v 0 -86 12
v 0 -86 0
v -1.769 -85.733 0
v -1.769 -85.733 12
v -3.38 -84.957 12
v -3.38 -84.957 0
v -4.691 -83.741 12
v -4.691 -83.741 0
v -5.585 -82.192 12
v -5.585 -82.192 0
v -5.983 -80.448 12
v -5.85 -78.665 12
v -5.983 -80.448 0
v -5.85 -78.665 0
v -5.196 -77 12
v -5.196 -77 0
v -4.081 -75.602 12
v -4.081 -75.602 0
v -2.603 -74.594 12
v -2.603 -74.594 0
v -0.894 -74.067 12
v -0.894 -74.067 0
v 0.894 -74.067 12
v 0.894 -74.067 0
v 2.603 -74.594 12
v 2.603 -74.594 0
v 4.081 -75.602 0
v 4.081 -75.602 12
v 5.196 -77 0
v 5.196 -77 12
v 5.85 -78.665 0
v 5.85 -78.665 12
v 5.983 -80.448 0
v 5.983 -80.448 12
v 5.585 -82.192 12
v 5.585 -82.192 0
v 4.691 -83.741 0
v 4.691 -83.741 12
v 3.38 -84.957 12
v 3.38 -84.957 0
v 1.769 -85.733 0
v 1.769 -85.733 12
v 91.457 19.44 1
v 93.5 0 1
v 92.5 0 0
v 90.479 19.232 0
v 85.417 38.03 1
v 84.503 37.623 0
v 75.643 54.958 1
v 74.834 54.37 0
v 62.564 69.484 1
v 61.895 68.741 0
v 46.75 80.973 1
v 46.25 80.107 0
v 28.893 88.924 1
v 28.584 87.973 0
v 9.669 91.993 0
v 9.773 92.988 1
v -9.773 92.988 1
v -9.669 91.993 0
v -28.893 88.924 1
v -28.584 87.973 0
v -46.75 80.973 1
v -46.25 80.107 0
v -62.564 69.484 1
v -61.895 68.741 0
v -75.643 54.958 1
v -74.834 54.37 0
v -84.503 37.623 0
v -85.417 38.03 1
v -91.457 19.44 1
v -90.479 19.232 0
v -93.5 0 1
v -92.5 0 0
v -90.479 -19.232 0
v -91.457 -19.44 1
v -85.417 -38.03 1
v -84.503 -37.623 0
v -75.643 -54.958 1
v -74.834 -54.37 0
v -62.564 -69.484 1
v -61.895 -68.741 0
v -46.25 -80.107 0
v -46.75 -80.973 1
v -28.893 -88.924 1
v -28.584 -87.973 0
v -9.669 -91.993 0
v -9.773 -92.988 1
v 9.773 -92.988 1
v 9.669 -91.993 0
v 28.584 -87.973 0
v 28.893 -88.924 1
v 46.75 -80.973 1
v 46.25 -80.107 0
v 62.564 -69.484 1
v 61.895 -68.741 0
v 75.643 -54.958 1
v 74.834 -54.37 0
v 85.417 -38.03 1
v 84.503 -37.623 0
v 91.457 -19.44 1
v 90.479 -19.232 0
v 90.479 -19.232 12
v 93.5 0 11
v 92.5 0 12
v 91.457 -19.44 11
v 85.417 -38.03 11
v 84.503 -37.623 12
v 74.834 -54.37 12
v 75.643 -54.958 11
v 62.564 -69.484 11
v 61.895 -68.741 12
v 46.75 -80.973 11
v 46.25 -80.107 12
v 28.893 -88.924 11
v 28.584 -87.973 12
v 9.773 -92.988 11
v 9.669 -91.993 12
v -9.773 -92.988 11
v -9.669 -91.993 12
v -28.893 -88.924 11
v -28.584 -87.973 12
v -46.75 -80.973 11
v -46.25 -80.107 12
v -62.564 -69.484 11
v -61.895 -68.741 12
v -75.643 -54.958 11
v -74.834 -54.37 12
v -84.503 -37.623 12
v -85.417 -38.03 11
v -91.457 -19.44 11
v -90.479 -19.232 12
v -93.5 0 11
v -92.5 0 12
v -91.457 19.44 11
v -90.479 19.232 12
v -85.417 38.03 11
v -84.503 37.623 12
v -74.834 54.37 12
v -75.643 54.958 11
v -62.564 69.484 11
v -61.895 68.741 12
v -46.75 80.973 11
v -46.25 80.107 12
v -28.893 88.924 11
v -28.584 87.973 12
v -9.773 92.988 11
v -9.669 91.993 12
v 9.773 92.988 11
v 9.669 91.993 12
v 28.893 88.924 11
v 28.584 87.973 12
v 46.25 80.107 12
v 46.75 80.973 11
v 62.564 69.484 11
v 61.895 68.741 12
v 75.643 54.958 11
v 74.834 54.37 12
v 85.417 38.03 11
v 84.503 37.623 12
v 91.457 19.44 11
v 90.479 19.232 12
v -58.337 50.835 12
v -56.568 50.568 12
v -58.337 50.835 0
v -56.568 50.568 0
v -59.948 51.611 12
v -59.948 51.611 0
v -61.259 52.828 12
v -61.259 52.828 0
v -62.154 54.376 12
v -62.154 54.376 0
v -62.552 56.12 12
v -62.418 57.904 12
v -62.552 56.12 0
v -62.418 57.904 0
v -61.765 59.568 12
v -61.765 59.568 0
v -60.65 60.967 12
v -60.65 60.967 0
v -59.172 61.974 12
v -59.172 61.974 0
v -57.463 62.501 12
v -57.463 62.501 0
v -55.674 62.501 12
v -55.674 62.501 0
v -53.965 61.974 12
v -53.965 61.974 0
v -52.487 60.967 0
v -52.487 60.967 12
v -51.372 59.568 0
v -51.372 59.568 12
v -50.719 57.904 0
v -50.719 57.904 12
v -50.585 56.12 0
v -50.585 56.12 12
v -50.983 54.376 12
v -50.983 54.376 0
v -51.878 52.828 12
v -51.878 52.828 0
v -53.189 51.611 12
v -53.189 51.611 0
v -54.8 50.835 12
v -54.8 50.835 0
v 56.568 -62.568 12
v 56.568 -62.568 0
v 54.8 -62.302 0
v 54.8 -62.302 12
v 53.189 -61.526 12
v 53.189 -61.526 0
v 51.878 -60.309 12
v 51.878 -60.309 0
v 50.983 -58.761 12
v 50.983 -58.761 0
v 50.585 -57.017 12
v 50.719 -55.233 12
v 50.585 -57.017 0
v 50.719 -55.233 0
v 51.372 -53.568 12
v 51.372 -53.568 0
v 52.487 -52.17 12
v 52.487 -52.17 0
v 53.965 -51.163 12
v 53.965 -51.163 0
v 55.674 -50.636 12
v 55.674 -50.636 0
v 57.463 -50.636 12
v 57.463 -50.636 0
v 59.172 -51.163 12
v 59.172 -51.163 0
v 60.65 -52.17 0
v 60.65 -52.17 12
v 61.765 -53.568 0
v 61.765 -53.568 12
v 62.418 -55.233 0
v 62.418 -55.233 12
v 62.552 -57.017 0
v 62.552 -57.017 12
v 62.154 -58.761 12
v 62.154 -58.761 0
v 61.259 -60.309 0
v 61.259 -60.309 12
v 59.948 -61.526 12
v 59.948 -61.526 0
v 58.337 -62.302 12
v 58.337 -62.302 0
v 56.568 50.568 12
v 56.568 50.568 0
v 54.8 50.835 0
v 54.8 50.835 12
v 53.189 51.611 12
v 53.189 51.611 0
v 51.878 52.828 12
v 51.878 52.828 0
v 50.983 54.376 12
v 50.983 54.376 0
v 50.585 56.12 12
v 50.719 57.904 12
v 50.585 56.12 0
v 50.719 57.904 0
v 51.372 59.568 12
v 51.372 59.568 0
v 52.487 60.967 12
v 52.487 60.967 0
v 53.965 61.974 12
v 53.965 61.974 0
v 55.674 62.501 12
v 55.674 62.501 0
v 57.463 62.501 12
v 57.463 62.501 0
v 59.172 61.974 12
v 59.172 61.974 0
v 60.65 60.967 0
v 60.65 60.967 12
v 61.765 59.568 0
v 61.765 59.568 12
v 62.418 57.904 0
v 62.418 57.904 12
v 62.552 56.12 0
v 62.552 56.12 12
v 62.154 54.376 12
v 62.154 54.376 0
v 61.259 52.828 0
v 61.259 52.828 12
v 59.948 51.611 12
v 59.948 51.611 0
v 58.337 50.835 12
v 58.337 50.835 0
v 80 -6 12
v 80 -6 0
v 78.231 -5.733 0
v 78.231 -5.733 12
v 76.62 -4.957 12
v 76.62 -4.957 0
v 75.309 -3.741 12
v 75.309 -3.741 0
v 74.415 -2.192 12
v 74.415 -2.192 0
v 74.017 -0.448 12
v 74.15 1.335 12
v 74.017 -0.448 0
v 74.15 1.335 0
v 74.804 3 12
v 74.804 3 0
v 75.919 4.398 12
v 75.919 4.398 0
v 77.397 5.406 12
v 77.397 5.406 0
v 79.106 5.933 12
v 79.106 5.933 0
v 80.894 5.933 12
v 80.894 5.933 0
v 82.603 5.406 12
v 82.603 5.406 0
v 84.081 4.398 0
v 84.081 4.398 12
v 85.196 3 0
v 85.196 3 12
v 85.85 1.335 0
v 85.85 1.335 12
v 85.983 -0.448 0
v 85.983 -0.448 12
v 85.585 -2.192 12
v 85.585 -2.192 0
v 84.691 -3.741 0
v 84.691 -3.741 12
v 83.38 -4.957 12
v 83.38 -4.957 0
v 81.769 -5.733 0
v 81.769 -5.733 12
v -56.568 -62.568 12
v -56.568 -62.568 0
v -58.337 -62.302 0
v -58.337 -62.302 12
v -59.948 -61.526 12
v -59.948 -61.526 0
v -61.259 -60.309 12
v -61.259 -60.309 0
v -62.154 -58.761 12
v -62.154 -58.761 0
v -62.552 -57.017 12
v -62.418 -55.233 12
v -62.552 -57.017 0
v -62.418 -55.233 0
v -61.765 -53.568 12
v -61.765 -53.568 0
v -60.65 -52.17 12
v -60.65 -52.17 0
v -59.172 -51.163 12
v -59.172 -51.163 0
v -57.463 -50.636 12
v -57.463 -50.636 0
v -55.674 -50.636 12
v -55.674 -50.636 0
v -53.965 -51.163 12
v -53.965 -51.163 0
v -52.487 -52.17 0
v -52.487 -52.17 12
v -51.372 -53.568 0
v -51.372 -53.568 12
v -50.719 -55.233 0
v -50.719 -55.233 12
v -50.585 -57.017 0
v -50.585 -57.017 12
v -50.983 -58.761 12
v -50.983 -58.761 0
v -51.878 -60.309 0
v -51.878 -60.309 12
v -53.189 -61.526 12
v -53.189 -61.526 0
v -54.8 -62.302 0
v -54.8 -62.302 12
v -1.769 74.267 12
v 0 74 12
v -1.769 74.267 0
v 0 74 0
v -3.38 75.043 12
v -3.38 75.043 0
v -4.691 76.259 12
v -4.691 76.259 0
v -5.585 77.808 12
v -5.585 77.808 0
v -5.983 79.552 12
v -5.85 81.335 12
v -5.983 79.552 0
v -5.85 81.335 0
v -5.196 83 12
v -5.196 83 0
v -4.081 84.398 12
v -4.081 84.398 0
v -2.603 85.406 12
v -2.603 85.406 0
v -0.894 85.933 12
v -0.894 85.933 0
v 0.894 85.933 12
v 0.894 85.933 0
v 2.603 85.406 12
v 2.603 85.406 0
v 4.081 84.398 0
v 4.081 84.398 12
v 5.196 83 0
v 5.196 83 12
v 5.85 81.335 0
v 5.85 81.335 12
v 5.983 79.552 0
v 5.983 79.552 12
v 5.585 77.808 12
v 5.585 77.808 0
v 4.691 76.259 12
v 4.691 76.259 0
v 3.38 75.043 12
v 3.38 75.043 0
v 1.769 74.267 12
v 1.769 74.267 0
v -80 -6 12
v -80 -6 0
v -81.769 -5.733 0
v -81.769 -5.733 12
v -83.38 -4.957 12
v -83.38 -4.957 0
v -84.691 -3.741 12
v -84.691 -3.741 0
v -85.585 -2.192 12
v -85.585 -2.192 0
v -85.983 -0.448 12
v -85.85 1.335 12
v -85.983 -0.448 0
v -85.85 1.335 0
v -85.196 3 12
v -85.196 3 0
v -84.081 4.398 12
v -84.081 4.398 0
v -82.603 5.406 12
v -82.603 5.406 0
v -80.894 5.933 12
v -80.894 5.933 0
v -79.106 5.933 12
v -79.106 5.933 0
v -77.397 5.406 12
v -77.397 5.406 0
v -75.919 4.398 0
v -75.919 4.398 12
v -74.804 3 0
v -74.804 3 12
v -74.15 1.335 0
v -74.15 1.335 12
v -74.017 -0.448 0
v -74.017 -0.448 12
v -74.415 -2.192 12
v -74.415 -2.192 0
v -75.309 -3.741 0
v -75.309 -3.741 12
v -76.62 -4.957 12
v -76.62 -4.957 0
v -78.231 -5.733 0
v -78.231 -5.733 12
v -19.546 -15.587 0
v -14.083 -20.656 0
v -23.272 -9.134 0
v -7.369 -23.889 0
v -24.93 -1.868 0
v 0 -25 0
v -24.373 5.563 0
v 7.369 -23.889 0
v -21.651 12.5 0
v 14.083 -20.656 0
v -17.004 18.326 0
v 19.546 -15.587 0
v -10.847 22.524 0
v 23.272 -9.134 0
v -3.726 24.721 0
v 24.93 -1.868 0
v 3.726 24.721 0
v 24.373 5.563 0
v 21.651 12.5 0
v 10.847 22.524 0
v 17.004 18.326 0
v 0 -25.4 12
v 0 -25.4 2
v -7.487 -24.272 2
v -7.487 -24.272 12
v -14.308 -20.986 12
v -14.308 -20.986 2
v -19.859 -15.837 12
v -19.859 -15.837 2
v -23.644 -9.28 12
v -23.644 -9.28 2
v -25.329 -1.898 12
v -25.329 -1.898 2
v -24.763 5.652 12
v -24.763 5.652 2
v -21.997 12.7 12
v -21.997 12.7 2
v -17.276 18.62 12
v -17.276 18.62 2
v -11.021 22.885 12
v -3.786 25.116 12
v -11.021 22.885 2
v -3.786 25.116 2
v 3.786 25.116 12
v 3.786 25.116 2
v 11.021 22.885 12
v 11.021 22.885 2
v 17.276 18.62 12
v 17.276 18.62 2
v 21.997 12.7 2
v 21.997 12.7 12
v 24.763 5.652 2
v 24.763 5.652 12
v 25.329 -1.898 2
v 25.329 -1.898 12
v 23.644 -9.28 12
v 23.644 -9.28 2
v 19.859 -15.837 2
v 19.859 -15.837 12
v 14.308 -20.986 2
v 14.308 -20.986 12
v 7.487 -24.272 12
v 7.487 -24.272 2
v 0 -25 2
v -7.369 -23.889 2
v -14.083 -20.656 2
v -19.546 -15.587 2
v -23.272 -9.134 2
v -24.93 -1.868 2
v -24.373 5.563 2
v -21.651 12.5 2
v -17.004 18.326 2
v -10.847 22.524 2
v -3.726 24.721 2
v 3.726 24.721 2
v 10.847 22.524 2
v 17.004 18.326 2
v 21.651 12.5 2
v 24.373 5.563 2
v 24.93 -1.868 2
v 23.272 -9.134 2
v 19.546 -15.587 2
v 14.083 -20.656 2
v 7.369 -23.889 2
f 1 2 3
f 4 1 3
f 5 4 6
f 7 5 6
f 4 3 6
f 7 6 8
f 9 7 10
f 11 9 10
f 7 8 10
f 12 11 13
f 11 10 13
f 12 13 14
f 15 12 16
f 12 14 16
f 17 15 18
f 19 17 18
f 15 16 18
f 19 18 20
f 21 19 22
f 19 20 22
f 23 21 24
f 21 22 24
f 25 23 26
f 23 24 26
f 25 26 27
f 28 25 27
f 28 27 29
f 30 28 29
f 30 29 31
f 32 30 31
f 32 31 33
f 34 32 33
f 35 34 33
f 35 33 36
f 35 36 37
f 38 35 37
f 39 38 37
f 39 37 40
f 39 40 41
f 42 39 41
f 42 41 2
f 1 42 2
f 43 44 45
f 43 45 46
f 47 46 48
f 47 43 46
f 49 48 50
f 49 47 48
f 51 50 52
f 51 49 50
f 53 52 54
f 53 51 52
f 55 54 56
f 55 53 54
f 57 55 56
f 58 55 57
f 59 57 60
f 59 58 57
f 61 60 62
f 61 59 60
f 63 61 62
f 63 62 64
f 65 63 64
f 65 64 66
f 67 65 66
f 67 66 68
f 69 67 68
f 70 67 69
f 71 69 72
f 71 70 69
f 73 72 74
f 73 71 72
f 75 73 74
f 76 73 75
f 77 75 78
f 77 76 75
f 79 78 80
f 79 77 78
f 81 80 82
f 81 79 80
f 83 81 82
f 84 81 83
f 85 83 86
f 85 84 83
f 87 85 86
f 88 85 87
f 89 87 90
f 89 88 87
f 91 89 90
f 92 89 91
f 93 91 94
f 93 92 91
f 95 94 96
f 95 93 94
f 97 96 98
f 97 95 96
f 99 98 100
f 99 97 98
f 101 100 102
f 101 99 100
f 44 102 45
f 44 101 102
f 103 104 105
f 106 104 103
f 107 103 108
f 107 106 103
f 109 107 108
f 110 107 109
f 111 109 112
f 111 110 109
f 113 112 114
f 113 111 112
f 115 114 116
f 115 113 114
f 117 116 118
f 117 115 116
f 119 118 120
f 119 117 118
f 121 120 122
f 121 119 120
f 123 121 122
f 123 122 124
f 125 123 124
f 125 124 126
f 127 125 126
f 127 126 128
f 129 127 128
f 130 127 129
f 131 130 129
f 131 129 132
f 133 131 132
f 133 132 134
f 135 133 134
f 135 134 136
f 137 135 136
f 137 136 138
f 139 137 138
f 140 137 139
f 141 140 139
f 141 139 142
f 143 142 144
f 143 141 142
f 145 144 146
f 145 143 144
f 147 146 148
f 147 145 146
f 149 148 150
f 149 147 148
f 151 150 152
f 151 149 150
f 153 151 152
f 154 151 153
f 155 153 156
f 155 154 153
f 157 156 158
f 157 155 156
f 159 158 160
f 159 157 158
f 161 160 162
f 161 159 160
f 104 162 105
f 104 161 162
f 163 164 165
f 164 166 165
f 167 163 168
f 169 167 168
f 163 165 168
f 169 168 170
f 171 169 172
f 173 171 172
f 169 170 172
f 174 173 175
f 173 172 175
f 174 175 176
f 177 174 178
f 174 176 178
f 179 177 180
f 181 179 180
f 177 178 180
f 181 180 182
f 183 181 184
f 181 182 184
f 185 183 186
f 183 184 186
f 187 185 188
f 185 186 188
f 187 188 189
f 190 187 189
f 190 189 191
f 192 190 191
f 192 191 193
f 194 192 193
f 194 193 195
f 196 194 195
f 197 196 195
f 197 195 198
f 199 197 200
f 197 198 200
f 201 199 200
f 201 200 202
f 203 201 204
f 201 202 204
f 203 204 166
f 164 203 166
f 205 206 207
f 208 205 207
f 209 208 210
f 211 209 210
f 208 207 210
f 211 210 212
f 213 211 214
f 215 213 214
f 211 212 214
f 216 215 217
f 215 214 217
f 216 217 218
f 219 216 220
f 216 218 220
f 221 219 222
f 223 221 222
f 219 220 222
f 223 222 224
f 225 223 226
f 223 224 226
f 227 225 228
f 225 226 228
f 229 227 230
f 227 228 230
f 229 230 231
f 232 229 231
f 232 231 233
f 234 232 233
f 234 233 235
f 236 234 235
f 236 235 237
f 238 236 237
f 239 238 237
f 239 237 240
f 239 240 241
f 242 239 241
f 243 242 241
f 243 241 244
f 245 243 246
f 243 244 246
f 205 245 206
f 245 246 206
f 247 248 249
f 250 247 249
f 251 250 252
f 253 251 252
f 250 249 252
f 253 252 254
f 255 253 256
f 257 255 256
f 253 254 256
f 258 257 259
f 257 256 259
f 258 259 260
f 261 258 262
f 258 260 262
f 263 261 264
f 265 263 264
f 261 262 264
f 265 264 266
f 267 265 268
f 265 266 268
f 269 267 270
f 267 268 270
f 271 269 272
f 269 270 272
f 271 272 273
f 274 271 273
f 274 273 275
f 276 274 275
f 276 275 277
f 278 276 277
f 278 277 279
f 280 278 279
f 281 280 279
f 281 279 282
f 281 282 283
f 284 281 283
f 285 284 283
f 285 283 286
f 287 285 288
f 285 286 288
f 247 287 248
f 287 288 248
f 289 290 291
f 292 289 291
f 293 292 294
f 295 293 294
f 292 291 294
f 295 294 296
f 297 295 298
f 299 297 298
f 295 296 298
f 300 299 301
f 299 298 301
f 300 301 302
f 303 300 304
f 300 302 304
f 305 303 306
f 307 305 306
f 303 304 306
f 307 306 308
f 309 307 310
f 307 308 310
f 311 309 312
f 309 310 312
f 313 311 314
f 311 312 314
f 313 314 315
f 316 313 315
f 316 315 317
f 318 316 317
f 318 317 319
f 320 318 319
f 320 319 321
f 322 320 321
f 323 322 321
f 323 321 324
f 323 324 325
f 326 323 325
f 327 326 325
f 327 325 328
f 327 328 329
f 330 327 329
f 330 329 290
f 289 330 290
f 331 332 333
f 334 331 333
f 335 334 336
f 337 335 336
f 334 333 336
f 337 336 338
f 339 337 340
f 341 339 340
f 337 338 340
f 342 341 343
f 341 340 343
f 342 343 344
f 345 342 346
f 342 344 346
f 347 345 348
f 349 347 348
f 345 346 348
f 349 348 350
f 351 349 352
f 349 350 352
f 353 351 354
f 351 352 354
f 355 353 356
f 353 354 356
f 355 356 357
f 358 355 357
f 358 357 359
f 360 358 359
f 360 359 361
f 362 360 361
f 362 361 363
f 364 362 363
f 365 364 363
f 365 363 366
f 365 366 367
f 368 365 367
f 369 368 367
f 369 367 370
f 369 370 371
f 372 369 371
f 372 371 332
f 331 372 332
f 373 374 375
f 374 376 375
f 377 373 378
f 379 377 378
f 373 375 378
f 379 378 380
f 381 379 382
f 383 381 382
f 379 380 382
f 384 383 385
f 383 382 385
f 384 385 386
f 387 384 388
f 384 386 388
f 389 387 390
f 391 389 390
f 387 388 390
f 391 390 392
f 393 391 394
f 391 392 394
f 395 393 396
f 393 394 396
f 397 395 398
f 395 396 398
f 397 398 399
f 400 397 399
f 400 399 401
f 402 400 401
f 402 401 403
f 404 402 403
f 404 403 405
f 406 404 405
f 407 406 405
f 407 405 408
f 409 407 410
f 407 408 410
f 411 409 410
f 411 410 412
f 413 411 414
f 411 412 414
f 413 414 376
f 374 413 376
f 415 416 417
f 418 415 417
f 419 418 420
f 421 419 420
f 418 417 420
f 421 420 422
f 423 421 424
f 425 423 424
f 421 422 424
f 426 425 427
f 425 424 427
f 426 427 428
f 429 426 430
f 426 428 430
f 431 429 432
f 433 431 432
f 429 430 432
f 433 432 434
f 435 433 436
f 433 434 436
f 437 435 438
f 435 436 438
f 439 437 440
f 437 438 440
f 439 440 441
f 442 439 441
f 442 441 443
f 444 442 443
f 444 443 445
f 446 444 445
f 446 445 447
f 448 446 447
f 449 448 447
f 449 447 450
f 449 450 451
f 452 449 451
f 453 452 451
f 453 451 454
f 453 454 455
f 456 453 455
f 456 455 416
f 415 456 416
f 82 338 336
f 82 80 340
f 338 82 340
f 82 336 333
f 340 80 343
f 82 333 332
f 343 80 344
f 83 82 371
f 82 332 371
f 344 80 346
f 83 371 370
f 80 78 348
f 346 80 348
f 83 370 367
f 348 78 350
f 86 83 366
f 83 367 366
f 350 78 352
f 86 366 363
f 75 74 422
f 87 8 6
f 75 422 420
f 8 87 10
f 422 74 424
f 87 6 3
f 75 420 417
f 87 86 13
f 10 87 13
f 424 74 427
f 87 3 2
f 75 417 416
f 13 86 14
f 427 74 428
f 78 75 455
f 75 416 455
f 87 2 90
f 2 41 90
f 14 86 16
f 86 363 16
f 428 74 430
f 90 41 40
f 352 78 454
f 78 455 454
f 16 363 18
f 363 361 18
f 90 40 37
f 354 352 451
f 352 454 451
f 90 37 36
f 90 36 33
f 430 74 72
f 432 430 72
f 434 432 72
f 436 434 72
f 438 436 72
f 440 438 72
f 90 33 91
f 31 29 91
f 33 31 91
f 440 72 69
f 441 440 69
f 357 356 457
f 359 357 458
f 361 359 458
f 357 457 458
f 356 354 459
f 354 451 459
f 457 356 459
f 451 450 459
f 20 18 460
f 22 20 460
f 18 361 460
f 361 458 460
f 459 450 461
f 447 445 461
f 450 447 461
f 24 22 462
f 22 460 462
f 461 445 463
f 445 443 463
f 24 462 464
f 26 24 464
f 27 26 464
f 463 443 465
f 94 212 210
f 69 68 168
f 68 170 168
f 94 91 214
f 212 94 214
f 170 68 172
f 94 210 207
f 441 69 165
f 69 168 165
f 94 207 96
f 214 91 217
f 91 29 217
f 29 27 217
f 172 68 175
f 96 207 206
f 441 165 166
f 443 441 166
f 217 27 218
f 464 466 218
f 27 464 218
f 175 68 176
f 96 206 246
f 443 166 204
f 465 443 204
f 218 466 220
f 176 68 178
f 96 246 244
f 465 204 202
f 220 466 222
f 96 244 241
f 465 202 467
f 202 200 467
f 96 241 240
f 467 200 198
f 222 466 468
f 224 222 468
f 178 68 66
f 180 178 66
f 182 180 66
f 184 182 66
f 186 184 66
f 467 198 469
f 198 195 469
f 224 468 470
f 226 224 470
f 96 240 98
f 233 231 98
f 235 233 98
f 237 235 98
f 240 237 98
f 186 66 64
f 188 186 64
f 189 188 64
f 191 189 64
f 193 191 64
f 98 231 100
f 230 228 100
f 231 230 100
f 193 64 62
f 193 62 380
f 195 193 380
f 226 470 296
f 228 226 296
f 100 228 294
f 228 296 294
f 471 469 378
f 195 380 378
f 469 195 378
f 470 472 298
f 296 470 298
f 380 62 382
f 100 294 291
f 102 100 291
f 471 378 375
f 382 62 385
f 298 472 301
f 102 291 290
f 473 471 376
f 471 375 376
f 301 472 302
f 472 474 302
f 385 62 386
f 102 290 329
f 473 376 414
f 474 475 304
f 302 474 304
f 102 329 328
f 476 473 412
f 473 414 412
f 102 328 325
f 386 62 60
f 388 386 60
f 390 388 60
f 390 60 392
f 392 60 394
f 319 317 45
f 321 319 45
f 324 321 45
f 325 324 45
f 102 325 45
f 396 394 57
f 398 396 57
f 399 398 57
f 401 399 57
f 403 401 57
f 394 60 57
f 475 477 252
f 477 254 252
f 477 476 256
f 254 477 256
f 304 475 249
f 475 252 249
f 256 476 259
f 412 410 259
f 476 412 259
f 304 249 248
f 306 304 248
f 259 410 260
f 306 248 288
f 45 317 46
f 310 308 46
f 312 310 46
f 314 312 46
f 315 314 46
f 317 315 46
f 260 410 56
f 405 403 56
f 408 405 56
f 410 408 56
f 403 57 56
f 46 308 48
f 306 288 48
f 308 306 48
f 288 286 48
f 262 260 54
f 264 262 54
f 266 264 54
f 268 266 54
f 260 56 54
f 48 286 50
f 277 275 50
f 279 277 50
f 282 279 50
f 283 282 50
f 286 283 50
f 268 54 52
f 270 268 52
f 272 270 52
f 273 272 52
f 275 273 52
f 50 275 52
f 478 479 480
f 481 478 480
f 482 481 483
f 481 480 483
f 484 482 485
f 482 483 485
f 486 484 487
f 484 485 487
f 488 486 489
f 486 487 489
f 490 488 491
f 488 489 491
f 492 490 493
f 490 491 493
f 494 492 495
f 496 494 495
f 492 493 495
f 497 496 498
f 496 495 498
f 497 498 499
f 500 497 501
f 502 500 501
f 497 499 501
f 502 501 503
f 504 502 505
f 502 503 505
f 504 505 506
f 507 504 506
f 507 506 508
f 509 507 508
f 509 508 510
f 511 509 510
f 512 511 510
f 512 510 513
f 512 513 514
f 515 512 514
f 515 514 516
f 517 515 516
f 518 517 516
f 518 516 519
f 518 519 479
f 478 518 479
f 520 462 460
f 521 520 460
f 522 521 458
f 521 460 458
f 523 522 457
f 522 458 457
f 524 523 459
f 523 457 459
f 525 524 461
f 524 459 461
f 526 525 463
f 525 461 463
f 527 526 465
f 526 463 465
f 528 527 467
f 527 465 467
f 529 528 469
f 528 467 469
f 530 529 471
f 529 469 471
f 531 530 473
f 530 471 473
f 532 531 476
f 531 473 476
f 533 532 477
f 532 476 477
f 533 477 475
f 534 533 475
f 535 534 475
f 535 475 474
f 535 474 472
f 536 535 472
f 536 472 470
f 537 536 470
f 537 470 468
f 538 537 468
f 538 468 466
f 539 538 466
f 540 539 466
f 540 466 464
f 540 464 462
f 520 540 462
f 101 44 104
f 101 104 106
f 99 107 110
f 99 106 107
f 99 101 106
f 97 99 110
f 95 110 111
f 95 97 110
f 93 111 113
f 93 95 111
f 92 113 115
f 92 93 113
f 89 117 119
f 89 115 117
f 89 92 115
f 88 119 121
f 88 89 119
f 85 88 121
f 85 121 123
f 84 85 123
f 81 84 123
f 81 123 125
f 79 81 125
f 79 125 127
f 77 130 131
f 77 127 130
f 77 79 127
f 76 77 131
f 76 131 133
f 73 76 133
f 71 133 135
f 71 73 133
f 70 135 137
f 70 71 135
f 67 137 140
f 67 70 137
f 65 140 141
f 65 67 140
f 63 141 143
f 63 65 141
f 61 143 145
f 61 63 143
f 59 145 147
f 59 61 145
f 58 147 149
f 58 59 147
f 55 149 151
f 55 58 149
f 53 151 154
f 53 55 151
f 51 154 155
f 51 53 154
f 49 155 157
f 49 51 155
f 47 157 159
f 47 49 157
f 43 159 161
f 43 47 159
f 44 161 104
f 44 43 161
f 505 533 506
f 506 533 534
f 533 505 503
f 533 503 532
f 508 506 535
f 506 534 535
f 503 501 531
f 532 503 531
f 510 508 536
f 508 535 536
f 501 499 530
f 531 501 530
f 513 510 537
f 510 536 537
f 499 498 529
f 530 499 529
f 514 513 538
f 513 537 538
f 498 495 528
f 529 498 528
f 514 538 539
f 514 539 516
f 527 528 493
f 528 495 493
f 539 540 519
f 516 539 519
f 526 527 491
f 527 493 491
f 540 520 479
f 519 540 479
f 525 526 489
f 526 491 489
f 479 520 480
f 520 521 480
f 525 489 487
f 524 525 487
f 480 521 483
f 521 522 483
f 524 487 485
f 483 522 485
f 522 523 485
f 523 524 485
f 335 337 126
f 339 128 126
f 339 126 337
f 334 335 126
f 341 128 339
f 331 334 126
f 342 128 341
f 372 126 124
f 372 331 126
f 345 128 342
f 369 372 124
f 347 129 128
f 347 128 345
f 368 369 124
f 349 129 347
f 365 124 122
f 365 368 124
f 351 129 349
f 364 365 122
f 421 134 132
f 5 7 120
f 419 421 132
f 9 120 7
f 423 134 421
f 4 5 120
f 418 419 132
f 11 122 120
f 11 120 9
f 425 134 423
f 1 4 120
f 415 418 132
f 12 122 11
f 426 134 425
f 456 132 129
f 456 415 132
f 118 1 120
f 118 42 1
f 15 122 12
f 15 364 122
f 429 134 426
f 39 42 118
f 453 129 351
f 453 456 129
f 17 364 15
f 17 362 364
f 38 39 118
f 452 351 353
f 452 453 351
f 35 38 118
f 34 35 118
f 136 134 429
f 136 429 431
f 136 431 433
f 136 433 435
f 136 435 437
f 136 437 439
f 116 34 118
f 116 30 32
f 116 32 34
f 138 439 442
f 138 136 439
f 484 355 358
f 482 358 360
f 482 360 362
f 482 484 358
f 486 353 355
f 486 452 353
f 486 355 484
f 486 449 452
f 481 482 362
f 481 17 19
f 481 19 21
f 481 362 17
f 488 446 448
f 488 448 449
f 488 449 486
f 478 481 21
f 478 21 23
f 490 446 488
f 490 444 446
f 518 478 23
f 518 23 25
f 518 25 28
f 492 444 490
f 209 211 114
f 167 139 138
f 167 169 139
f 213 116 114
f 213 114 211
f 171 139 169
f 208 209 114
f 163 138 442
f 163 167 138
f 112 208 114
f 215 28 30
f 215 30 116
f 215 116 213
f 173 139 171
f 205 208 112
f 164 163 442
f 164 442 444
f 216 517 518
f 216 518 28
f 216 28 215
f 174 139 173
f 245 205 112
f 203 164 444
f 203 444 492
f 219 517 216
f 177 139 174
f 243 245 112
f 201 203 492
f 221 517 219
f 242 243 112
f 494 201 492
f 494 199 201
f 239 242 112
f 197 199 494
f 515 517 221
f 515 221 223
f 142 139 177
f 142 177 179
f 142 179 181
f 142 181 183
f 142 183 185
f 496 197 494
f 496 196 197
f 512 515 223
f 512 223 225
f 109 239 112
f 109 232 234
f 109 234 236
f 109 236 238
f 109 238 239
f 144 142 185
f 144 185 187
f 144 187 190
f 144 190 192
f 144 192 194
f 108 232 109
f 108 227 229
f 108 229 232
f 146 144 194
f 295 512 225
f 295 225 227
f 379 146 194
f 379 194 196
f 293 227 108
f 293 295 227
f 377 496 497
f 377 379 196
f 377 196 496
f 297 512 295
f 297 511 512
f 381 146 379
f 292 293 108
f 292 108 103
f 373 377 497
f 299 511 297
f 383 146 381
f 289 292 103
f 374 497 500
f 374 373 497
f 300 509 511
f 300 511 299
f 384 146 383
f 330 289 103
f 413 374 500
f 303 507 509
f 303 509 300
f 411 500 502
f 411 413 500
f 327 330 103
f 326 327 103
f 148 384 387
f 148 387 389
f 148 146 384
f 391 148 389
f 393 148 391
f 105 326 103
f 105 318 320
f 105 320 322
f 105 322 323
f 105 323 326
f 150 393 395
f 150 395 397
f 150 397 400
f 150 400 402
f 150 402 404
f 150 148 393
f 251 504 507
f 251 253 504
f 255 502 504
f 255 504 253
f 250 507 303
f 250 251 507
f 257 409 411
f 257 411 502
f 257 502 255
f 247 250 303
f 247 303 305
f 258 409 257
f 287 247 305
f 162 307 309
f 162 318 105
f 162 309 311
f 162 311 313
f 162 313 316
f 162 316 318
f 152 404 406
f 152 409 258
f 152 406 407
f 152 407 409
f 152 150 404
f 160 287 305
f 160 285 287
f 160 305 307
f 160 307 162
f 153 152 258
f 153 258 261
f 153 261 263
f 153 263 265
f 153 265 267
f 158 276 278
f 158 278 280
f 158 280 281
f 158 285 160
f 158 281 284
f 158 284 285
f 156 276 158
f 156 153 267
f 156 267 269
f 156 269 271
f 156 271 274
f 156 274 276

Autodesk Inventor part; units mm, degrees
ref_plane "YZ Plane" through (0, 0, 0) normal (1, 0, 0) x (0, 1, 0)
ref_plane "XZ Plane" through (0, 0, 0) normal (0, 1, 0) x (-1, 0, 0)
ref_plane "XY Plane" through (0, 0, 0) normal (0, 0, 1) x (1, 0, 0)
sketch "草圖1" plane through (0, 0, 0) normal (0, 0, 1) x (1, 0, 0)
  circle A0 centre (0, 0) radius 93.5
  dimension "d0" = 187
extrude "擠出1" add sketch "草圖1" along normal blind 12
hole "孔1" at (0, 0, 12) direction (0, 0, -1) diameter 50 end through all counterbore diameter 50.8 counterbore depth 10
sketch "草圖2" plane through (0, 0, 12) normal (0, 0, 1) x (1, 0, 0)
  circle A0 centre (0, 0) radius 80 construction
  line L0 (0, 0) -> (56.5685, 56.5685) construction
  line L1 (0, 0) -> (80, 0) construction
  point P0 (0, 80)
  point P1 (-80, 0)
  point P2 (0, -80)
  point P3 (-56.5685, 56.5685)
  point P4 (-56.5685, -56.5685)
  point P5 (56.5685, -56.5685)
  dimension "d12" = 160
  dimension "d13" = 45
hole "孔2" at (0, 80, 12) at (-80, 0, 12) at (80, 0, 12) at (0, -80, 12) at (56.5685, 56.5685, 12) at (-56.5685, 56.5685, 12) at (-56.5685, -56.5685, 12) at (56.5685, -56.5685, 12) direction (0, 0, -1) diameter 12 end through all
chamfer "倒角1" distance 1 angle 45 2 edges at (-93.5, 0, 12) (-93.5, 0, 0)
